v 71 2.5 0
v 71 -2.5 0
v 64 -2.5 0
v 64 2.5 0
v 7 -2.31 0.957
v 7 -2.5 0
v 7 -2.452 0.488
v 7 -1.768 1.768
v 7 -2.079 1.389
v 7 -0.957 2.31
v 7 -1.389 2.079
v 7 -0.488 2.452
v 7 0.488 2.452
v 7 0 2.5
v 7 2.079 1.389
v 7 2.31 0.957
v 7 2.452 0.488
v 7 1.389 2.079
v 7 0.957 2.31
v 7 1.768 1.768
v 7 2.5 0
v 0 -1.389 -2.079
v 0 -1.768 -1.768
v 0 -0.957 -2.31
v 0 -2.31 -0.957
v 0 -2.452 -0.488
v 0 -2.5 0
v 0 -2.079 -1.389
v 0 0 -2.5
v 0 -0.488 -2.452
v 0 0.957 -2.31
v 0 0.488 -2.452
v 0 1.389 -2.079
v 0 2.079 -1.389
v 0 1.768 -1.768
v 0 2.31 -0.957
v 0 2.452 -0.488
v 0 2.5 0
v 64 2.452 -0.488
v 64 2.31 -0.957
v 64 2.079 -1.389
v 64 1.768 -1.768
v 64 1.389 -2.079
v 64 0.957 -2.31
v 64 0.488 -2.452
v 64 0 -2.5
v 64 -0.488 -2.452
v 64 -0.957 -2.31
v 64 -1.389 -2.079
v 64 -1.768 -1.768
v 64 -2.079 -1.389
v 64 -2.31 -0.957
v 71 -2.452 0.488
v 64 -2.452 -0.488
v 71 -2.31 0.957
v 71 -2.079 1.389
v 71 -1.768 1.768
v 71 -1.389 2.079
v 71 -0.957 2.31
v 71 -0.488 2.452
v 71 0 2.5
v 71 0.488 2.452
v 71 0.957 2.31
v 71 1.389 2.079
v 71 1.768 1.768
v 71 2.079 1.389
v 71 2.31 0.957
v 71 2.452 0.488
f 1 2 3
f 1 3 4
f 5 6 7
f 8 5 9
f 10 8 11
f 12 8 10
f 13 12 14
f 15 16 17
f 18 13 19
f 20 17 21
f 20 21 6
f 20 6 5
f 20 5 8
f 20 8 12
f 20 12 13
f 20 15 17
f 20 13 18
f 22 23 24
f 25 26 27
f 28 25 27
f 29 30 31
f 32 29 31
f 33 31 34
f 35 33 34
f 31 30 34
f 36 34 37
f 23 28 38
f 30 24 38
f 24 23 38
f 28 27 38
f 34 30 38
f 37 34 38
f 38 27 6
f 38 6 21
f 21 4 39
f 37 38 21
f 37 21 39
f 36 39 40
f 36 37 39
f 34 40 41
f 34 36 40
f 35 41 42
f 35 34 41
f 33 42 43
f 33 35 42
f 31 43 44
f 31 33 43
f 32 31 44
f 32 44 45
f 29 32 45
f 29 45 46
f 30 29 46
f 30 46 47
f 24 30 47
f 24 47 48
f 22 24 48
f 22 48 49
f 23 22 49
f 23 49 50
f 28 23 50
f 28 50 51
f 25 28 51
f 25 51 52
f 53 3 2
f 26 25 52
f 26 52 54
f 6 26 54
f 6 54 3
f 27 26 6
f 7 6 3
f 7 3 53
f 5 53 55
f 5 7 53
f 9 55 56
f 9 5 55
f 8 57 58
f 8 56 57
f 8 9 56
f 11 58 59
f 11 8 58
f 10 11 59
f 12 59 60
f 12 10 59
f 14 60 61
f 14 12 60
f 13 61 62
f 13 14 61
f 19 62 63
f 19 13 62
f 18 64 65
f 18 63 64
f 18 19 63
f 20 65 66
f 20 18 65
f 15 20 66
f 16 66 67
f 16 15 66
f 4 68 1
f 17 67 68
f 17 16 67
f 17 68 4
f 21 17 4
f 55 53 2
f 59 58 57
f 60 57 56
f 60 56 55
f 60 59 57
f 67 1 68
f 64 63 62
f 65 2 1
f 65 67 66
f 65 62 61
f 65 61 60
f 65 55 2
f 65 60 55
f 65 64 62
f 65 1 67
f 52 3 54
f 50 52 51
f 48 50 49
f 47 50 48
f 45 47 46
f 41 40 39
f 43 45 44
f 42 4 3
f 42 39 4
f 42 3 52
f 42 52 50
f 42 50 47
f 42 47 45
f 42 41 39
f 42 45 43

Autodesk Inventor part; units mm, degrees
ref_plane "YZ Plane" through (0, 0, 0) normal (1, 0, 0) x (0, 1, 0)
ref_plane "XZ Plane" through (0, 0, 0) normal (0, 1, 0) x (-1, 0, 0)
ref_plane "XY Plane" through (0, 0, 0) normal (0, 0, 1) x (1, 0, 0)
sketch "Sketch1" plane through (0, 0, 0) normal (1, 0, 0) x (0, 1, 0)
  circle A0 centre (0, 0) radius 2.5
  dimension "d0" = 5
extrude "Extrusion1" add sketch "Sketch1" along normal blind 71
sketch "Sketch2" plane through (71, 0, 0) normal (1, 0, 0) x (0, 0, -1)
  circle A0 centre (0, 0) radius 2.5 projected
  arc A1 (0, -2.5) -> (0, 2.5) centre (0, 0) ccw
  line L0 (0, -2.5) -> (0, 2.5)
extrude "Extrusion2" cut sketch "Sketch2" against normal blind 7 contours A0 L0 picked at (0.5196, 0.6515)
sketch "Sketch3" plane through (0, 0, 0) normal (-1, 0, 0) x (0, 0, 1)
  arc A0 (0, 2.5) -> (0, -2.5) centre (0, 0) ccw projected
  circle A1 centre (0, 0) radius 2.5 projected
  arc A2 (0, -2.5) -> (0, 2.5) centre (0, 0) ccw
  arc A3 (0, -2.5) -> (0, 2.5) centre (0, 0) ccw projected
  line L0 (0, -2.5) -> (0, 2.5)
extrude "Extrusion3" cut sketch "Sketch3" against normal blind 7 contours A1 L0
properties part number "Aluminum_Rod_70mm"
